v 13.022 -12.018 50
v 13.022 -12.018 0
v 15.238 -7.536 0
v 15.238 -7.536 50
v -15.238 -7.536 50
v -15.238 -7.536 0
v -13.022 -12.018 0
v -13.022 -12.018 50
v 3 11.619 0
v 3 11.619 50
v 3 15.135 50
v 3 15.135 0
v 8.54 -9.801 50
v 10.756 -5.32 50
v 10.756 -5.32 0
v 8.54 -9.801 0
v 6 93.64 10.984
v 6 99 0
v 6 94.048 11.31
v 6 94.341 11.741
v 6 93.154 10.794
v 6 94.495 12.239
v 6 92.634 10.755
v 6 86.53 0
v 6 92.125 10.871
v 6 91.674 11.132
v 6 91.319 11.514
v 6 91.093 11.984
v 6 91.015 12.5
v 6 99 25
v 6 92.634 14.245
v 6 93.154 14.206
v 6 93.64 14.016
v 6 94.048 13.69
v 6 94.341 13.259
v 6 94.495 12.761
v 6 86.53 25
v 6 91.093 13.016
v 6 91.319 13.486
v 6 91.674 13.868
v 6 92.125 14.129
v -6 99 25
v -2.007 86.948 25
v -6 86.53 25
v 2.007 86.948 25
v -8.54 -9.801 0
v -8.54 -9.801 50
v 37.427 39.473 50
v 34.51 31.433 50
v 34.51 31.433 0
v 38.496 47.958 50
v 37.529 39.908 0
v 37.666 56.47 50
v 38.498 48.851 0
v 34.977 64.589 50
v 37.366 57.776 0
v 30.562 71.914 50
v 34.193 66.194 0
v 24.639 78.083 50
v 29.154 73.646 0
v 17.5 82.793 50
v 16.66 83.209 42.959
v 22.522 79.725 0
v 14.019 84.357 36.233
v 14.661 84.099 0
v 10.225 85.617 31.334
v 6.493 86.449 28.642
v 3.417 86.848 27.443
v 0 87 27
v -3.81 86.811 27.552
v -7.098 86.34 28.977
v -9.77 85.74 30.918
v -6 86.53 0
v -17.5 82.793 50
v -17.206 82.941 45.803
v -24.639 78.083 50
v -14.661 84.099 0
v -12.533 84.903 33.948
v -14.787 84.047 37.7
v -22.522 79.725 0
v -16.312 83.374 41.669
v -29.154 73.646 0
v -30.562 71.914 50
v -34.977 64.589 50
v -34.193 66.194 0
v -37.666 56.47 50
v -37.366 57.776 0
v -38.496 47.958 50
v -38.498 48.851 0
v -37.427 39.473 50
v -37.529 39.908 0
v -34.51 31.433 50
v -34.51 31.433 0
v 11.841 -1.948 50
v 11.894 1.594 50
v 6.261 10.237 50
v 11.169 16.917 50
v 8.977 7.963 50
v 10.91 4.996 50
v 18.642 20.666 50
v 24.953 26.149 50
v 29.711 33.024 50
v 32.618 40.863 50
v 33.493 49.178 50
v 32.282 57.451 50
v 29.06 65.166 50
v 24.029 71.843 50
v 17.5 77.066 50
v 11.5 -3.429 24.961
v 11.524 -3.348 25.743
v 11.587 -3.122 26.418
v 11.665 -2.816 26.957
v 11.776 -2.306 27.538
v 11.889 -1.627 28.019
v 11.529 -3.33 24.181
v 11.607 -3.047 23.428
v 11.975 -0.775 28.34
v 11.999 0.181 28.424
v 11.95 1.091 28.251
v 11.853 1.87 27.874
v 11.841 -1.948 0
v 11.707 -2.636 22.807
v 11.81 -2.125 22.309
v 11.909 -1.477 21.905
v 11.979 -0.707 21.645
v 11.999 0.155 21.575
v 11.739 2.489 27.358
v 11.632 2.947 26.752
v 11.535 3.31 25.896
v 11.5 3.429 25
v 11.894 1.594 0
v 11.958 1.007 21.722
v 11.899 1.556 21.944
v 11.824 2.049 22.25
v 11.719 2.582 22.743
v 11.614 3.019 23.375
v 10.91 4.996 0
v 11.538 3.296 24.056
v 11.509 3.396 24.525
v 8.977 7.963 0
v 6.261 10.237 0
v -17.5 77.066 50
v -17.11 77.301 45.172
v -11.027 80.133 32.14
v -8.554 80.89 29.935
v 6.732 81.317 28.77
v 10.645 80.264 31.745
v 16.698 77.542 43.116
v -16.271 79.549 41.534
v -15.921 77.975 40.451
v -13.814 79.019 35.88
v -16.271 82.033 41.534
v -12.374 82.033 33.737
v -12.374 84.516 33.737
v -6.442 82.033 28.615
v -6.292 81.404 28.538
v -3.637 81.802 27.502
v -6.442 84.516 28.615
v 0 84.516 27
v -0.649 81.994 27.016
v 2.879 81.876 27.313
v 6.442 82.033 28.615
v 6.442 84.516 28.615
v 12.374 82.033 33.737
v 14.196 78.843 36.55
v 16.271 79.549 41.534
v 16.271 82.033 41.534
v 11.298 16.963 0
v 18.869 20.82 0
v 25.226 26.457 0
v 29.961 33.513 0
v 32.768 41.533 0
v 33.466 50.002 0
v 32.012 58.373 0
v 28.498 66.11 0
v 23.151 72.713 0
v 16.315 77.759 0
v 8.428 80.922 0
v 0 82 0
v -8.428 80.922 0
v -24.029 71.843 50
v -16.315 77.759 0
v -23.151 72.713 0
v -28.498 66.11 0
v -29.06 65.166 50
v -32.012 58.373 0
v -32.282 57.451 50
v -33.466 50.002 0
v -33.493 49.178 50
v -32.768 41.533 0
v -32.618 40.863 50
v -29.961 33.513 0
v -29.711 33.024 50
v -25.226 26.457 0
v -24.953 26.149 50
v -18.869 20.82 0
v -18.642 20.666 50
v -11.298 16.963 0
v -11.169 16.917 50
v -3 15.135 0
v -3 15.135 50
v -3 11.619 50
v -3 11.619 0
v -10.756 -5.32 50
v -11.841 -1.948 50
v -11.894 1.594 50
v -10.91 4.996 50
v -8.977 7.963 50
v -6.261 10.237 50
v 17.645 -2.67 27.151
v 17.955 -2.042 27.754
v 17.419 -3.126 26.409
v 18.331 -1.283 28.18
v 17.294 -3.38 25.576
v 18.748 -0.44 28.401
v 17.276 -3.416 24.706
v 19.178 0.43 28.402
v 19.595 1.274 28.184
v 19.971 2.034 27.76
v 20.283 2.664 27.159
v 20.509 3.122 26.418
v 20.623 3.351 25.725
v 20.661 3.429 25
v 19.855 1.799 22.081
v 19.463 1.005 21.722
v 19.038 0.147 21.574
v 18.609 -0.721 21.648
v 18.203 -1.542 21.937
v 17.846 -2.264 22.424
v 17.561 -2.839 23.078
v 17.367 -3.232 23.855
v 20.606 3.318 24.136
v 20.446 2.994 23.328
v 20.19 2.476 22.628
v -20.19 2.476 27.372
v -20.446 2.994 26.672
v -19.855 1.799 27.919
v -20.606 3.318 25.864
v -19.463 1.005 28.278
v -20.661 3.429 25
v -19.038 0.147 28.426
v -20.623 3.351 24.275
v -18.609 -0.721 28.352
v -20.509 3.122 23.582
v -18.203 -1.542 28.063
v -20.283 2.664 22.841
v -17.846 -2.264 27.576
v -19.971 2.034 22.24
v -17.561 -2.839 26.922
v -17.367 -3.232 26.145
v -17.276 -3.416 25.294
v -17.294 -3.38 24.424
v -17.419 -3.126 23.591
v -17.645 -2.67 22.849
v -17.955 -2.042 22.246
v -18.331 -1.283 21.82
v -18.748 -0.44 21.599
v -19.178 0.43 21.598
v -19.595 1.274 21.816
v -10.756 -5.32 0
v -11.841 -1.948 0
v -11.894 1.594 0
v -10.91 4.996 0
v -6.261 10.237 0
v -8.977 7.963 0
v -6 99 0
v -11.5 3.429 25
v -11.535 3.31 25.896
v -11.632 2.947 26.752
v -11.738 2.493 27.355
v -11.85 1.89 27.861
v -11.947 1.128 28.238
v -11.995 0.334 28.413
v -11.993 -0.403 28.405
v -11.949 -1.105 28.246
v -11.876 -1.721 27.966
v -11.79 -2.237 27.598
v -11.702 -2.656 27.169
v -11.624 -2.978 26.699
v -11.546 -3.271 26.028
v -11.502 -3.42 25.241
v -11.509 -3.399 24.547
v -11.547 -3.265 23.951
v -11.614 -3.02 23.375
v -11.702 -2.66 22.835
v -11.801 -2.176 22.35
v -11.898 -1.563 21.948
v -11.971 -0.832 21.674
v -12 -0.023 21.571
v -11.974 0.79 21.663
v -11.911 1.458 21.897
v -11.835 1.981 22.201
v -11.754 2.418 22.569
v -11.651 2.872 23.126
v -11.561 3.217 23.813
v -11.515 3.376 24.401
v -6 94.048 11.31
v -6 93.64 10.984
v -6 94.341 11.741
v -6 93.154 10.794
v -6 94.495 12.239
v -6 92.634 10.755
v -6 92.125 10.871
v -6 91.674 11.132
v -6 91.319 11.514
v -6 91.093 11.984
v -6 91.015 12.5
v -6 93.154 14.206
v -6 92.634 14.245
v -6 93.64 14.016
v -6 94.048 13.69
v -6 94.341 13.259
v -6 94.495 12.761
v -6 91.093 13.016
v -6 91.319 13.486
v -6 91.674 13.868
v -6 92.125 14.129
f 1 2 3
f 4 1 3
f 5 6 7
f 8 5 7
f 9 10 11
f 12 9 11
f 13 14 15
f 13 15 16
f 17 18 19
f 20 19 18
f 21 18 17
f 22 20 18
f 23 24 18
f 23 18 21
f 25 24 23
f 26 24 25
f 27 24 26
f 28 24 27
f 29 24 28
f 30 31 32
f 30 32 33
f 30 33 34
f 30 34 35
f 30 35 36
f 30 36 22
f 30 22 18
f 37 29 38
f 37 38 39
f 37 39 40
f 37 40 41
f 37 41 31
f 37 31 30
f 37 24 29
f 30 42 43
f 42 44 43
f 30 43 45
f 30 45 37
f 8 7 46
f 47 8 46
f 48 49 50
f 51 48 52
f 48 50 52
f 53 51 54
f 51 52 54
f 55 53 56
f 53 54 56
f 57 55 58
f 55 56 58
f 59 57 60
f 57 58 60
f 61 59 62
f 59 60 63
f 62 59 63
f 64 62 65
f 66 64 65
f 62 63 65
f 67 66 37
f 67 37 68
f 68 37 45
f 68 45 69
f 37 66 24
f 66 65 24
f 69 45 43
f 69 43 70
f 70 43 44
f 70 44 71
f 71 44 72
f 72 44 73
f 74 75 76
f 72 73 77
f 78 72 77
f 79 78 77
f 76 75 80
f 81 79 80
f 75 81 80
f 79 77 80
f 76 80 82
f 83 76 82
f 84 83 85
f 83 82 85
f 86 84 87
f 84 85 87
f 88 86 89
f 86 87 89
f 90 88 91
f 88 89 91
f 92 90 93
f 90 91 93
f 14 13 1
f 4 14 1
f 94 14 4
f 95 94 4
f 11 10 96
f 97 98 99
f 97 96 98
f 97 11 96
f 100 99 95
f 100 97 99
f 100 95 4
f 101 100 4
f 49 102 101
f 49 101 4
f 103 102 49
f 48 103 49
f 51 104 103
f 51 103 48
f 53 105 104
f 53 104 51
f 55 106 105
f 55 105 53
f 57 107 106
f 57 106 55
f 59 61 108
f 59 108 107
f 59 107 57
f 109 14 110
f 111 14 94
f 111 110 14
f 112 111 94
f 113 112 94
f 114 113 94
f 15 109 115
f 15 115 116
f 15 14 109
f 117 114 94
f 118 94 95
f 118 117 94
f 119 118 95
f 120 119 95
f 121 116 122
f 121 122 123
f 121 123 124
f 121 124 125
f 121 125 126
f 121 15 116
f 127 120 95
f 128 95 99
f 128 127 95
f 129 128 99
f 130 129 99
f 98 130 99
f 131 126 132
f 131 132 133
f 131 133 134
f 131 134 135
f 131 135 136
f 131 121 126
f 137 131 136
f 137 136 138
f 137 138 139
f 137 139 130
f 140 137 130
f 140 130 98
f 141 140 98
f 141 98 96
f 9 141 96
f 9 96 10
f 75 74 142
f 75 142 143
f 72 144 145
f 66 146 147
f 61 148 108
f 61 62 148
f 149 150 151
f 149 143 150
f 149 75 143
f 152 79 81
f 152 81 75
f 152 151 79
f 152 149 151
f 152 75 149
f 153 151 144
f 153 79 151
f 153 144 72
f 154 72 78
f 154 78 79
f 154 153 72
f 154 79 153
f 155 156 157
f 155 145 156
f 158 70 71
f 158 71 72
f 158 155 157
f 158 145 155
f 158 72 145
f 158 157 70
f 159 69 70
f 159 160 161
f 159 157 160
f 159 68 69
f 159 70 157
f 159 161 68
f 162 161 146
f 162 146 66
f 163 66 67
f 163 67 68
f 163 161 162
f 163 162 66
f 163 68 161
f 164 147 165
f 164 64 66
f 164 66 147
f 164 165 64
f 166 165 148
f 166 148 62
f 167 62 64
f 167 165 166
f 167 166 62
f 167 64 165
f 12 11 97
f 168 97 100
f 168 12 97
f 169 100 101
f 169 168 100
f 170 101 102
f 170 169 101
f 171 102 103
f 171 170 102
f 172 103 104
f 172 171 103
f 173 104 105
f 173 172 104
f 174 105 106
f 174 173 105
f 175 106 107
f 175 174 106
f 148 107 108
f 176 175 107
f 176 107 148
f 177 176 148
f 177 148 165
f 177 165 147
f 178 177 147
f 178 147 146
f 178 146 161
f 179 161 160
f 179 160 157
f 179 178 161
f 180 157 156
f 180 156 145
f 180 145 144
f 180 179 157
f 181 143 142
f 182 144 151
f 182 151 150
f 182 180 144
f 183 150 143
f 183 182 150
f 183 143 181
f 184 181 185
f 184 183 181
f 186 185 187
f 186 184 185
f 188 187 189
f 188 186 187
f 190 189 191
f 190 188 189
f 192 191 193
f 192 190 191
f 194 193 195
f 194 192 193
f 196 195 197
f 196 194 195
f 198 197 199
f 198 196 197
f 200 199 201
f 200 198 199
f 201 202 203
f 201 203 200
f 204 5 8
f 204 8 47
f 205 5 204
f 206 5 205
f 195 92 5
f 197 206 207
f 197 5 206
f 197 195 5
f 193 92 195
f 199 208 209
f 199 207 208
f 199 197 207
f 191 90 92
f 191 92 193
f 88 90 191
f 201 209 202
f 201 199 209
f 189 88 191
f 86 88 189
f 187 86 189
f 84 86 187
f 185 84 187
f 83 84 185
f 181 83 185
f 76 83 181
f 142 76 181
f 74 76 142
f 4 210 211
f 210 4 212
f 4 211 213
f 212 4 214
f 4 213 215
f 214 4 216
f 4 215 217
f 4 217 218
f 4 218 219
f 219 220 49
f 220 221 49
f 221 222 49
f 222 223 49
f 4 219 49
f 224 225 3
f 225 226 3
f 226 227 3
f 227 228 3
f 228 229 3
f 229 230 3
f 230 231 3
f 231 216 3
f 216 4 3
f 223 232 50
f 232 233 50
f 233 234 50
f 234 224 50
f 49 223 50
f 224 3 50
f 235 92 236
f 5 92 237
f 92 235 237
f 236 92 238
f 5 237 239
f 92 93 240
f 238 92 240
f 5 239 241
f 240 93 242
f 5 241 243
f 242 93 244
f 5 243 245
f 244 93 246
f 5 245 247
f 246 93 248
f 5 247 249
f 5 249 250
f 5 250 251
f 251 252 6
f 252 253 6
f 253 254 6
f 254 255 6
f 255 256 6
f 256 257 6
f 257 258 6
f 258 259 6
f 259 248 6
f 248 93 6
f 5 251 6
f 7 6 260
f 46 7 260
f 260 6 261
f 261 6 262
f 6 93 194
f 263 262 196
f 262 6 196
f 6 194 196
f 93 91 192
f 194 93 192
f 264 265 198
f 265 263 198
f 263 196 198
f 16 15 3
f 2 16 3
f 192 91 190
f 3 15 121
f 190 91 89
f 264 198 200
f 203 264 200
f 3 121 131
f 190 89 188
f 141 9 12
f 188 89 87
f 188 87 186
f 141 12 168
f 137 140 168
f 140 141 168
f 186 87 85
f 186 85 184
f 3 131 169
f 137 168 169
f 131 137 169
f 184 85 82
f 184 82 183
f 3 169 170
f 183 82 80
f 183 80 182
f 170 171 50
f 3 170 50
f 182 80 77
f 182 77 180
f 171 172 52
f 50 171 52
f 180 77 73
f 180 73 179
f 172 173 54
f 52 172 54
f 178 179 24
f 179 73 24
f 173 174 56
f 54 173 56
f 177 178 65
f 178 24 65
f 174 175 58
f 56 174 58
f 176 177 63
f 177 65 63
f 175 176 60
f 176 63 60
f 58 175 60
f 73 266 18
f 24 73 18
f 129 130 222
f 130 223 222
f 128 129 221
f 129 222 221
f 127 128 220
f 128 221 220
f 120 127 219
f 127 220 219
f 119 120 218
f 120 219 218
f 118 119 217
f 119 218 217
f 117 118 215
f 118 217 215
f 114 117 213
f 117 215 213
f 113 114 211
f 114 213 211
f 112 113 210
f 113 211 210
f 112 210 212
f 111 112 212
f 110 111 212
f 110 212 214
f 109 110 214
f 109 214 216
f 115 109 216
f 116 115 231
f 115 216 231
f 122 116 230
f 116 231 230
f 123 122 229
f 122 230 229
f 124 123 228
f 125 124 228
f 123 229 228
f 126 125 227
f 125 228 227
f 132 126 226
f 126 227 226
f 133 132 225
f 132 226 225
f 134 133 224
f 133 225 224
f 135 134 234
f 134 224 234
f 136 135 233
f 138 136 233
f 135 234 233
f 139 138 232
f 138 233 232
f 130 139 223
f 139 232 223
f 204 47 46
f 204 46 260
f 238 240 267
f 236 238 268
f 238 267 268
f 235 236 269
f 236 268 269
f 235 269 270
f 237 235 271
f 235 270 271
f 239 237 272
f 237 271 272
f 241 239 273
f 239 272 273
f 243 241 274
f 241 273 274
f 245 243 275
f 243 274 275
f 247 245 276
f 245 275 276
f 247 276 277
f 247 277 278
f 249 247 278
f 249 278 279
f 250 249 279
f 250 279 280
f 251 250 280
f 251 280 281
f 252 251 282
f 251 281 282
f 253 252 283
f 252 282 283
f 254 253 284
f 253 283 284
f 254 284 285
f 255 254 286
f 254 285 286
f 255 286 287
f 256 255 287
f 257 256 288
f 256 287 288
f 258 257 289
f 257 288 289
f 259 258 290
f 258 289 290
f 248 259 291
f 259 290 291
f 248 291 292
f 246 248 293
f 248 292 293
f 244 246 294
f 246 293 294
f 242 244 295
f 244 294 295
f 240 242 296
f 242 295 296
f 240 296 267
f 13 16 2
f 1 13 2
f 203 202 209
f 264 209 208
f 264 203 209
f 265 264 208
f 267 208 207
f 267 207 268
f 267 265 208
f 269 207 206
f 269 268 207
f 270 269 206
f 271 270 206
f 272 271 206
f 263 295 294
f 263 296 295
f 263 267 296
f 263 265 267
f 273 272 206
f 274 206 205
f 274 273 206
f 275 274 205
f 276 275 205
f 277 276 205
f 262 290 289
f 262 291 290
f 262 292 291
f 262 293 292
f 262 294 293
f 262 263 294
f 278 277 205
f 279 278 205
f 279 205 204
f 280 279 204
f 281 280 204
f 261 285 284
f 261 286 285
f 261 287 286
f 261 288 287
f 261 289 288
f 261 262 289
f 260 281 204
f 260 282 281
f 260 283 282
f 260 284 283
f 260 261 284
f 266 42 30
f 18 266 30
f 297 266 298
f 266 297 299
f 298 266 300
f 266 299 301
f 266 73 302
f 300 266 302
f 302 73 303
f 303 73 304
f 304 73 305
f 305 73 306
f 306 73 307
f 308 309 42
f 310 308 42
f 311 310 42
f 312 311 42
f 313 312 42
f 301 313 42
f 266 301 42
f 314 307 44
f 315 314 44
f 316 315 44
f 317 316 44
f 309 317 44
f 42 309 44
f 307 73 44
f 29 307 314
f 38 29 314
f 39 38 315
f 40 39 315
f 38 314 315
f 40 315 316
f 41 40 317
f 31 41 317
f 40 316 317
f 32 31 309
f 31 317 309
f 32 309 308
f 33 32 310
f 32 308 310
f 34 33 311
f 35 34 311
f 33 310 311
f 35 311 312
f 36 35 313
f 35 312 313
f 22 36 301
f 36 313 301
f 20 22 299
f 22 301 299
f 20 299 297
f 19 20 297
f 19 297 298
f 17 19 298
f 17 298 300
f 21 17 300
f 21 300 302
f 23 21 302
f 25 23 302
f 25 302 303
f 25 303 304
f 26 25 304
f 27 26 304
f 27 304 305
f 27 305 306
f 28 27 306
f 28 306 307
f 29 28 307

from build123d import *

# Parameters (mm, degrees)
F0_R      = 12
F0_R_2    = 33.5
F1_DEPTH  = 50
F4_DEPTH  = 25
F5_W      = 12
F5_H      = 25
F6_DEPTH  = 1
F7_DEPTH  = 12
F8_R      = 3.429
F9_DEPTH  = 30
F10_R     = 1.75
F11_DEPTH = 25
F12_W     = 6
F12_H     = 8.7619052733
F13_DEPTH = 55
F15_DEPTH = 52
F17_DEPTH = 50


with BuildPart() as f1:
    # F0 (on Top) → F1 (new body)
    with BuildSketch(Plane.XY):
        with BuildLine():
            ThreePointArc((34.510392045, 31.4329896907), (0, 87), (-34.510392045, 31.4329896907))
            Line((-34.510392045, 31.4329896907), (-15.238354929, -7.5360824742))
            ThreePointArc((-15.238354929, -7.5360824742), (0, -17), (15.238354929, -7.5360824742))
            Line((15.238354929, -7.5360824742), (34.510392045, 31.4329896907))
        make_face()
        Circle(F0_R, mode=Mode.SUBTRACT)
        with Locations((0, 48.5)):
            Circle(F0_R_2, mode=Mode.SUBTRACT)
    extrude(amount=F1_DEPTH)

    # F3 (on offset) → F4 (cut)
    with BuildSketch(Plane.XZ.offset(-87)):
        with BuildLine():
            add(Edge.make_bspline(
                [(17.5, 50), (17.5, 73), (0, 73), (-17.5, 73), (-17.5, 50)],
                knots=[1.5707963268, 1.5707963268, 1.5707963268, 3.1415926536, 3.1415926536, 4.7123889804, 4.7123889804, 4.7123889804], degree=2, weights=[1, 0.7071067812, 1, 0.7071067812, 1]))
            Line((-17.5, 50), (17.5, 50))
        make_face()
        with BuildLine():
            Line((17.5, 50), (-17.5, 50))
            add(Edge.make_bspline(
                [(-17.5, 50), (-17.5, 27), (0, 27)],
                knots=[4.7123889804, 4.7123889804, 4.7123889804, 6.2831853072, 6.2831853072, 6.2831853072], degree=2, weights=[1, 0.7071067812, 1]))
            add(Edge.make_bspline(
                [(0, 27), (17.5, 27), (17.5, 50)],
                knots=[0, 0, 0, 1.5707963268, 1.5707963268, 1.5707963268], degree=2, weights=[1, 0.7071067812, 1]))
        make_face()
    extrude(amount=F4_DEPTH, mode=Mode.SUBTRACT)

    # F5 (on offset) → F6 (join)
    with BuildSketch(Plane.XZ.offset(-87)):
        with Locations((0, 12.5)):
            Rectangle(F5_W, F5_H)
    extrude(amount=F6_DEPTH)

    # F5 (on offset) → F7 (join)
    with BuildSketch(Plane.XZ.offset(-87)):
        with Locations((0, 12.5)):
            Rectangle(F5_W, F5_H)
    extrude(amount=-F7_DEPTH)

    # F8 (on Right) → F9 (cut, symmetric)
    with BuildSketch(Plane.YZ):
        with Locations((0, 25)):
            Circle(F8_R)
    extrude(amount=F9_DEPTH, both=True, mode=Mode.SUBTRACT)

    # F10 (on face) → F11 (cut)
    with BuildSketch(Plane(origin=(-6, 0, 0), x_dir=(0, -1, 0), z_dir=(-1, 0, 0))):
        with Locations((-92.7647968698, 12.5)):
            Circle(F10_R)
    extrude(amount=-F11_DEPTH, mode=Mode.SUBTRACT)

    # F12 (on face) → F13 (cut)
    with BuildSketch(Plane.XY.offset(50)):
        with Locations((0, 13.4115335532)):
            Rectangle(F12_W, F12_H)
    extrude(amount=-F13_DEPTH, mode=Mode.SUBTRACT)

    # F14 (on face) → F15 (cut)
    with BuildSketch(Plane.XY.offset(50)):
        with BuildLine():
            ThreePointArc((10.7564858322, -5.3195876289), (0, -12), (-10.7564858322, -5.3195876289))
            Line((-10.7564858322, -5.3195876289), (-15.238354929, -7.5360824742))
            ThreePointArc((-15.238354929, -7.5360824742), (0, -17), (15.238354929, -7.5360824742))
            Line((15.238354929, -7.5360824742), (10.7564858322, -5.3195876289))
        make_face()
    extrude(amount=-F15_DEPTH, mode=Mode.SUBTRACT)

    # F16 (on Top) → F17 (join)
    with BuildSketch(Plane.XY):
        Polygon((-10.7564858322, -5.3195876289), (-15.238354929, -7.5360824742), (-13.0218600836, -12.017951571), (-8.5399909869, -9.8014567256), align=None)
        Polygon((13.0218600836, -12.017951571), (15.238354929, -7.5360824742), (10.7564858322, -5.3195876289), (8.5399909869, -9.8014567256), align=None)
    extrude(amount=F17_DEPTH)


solid = f1.part
